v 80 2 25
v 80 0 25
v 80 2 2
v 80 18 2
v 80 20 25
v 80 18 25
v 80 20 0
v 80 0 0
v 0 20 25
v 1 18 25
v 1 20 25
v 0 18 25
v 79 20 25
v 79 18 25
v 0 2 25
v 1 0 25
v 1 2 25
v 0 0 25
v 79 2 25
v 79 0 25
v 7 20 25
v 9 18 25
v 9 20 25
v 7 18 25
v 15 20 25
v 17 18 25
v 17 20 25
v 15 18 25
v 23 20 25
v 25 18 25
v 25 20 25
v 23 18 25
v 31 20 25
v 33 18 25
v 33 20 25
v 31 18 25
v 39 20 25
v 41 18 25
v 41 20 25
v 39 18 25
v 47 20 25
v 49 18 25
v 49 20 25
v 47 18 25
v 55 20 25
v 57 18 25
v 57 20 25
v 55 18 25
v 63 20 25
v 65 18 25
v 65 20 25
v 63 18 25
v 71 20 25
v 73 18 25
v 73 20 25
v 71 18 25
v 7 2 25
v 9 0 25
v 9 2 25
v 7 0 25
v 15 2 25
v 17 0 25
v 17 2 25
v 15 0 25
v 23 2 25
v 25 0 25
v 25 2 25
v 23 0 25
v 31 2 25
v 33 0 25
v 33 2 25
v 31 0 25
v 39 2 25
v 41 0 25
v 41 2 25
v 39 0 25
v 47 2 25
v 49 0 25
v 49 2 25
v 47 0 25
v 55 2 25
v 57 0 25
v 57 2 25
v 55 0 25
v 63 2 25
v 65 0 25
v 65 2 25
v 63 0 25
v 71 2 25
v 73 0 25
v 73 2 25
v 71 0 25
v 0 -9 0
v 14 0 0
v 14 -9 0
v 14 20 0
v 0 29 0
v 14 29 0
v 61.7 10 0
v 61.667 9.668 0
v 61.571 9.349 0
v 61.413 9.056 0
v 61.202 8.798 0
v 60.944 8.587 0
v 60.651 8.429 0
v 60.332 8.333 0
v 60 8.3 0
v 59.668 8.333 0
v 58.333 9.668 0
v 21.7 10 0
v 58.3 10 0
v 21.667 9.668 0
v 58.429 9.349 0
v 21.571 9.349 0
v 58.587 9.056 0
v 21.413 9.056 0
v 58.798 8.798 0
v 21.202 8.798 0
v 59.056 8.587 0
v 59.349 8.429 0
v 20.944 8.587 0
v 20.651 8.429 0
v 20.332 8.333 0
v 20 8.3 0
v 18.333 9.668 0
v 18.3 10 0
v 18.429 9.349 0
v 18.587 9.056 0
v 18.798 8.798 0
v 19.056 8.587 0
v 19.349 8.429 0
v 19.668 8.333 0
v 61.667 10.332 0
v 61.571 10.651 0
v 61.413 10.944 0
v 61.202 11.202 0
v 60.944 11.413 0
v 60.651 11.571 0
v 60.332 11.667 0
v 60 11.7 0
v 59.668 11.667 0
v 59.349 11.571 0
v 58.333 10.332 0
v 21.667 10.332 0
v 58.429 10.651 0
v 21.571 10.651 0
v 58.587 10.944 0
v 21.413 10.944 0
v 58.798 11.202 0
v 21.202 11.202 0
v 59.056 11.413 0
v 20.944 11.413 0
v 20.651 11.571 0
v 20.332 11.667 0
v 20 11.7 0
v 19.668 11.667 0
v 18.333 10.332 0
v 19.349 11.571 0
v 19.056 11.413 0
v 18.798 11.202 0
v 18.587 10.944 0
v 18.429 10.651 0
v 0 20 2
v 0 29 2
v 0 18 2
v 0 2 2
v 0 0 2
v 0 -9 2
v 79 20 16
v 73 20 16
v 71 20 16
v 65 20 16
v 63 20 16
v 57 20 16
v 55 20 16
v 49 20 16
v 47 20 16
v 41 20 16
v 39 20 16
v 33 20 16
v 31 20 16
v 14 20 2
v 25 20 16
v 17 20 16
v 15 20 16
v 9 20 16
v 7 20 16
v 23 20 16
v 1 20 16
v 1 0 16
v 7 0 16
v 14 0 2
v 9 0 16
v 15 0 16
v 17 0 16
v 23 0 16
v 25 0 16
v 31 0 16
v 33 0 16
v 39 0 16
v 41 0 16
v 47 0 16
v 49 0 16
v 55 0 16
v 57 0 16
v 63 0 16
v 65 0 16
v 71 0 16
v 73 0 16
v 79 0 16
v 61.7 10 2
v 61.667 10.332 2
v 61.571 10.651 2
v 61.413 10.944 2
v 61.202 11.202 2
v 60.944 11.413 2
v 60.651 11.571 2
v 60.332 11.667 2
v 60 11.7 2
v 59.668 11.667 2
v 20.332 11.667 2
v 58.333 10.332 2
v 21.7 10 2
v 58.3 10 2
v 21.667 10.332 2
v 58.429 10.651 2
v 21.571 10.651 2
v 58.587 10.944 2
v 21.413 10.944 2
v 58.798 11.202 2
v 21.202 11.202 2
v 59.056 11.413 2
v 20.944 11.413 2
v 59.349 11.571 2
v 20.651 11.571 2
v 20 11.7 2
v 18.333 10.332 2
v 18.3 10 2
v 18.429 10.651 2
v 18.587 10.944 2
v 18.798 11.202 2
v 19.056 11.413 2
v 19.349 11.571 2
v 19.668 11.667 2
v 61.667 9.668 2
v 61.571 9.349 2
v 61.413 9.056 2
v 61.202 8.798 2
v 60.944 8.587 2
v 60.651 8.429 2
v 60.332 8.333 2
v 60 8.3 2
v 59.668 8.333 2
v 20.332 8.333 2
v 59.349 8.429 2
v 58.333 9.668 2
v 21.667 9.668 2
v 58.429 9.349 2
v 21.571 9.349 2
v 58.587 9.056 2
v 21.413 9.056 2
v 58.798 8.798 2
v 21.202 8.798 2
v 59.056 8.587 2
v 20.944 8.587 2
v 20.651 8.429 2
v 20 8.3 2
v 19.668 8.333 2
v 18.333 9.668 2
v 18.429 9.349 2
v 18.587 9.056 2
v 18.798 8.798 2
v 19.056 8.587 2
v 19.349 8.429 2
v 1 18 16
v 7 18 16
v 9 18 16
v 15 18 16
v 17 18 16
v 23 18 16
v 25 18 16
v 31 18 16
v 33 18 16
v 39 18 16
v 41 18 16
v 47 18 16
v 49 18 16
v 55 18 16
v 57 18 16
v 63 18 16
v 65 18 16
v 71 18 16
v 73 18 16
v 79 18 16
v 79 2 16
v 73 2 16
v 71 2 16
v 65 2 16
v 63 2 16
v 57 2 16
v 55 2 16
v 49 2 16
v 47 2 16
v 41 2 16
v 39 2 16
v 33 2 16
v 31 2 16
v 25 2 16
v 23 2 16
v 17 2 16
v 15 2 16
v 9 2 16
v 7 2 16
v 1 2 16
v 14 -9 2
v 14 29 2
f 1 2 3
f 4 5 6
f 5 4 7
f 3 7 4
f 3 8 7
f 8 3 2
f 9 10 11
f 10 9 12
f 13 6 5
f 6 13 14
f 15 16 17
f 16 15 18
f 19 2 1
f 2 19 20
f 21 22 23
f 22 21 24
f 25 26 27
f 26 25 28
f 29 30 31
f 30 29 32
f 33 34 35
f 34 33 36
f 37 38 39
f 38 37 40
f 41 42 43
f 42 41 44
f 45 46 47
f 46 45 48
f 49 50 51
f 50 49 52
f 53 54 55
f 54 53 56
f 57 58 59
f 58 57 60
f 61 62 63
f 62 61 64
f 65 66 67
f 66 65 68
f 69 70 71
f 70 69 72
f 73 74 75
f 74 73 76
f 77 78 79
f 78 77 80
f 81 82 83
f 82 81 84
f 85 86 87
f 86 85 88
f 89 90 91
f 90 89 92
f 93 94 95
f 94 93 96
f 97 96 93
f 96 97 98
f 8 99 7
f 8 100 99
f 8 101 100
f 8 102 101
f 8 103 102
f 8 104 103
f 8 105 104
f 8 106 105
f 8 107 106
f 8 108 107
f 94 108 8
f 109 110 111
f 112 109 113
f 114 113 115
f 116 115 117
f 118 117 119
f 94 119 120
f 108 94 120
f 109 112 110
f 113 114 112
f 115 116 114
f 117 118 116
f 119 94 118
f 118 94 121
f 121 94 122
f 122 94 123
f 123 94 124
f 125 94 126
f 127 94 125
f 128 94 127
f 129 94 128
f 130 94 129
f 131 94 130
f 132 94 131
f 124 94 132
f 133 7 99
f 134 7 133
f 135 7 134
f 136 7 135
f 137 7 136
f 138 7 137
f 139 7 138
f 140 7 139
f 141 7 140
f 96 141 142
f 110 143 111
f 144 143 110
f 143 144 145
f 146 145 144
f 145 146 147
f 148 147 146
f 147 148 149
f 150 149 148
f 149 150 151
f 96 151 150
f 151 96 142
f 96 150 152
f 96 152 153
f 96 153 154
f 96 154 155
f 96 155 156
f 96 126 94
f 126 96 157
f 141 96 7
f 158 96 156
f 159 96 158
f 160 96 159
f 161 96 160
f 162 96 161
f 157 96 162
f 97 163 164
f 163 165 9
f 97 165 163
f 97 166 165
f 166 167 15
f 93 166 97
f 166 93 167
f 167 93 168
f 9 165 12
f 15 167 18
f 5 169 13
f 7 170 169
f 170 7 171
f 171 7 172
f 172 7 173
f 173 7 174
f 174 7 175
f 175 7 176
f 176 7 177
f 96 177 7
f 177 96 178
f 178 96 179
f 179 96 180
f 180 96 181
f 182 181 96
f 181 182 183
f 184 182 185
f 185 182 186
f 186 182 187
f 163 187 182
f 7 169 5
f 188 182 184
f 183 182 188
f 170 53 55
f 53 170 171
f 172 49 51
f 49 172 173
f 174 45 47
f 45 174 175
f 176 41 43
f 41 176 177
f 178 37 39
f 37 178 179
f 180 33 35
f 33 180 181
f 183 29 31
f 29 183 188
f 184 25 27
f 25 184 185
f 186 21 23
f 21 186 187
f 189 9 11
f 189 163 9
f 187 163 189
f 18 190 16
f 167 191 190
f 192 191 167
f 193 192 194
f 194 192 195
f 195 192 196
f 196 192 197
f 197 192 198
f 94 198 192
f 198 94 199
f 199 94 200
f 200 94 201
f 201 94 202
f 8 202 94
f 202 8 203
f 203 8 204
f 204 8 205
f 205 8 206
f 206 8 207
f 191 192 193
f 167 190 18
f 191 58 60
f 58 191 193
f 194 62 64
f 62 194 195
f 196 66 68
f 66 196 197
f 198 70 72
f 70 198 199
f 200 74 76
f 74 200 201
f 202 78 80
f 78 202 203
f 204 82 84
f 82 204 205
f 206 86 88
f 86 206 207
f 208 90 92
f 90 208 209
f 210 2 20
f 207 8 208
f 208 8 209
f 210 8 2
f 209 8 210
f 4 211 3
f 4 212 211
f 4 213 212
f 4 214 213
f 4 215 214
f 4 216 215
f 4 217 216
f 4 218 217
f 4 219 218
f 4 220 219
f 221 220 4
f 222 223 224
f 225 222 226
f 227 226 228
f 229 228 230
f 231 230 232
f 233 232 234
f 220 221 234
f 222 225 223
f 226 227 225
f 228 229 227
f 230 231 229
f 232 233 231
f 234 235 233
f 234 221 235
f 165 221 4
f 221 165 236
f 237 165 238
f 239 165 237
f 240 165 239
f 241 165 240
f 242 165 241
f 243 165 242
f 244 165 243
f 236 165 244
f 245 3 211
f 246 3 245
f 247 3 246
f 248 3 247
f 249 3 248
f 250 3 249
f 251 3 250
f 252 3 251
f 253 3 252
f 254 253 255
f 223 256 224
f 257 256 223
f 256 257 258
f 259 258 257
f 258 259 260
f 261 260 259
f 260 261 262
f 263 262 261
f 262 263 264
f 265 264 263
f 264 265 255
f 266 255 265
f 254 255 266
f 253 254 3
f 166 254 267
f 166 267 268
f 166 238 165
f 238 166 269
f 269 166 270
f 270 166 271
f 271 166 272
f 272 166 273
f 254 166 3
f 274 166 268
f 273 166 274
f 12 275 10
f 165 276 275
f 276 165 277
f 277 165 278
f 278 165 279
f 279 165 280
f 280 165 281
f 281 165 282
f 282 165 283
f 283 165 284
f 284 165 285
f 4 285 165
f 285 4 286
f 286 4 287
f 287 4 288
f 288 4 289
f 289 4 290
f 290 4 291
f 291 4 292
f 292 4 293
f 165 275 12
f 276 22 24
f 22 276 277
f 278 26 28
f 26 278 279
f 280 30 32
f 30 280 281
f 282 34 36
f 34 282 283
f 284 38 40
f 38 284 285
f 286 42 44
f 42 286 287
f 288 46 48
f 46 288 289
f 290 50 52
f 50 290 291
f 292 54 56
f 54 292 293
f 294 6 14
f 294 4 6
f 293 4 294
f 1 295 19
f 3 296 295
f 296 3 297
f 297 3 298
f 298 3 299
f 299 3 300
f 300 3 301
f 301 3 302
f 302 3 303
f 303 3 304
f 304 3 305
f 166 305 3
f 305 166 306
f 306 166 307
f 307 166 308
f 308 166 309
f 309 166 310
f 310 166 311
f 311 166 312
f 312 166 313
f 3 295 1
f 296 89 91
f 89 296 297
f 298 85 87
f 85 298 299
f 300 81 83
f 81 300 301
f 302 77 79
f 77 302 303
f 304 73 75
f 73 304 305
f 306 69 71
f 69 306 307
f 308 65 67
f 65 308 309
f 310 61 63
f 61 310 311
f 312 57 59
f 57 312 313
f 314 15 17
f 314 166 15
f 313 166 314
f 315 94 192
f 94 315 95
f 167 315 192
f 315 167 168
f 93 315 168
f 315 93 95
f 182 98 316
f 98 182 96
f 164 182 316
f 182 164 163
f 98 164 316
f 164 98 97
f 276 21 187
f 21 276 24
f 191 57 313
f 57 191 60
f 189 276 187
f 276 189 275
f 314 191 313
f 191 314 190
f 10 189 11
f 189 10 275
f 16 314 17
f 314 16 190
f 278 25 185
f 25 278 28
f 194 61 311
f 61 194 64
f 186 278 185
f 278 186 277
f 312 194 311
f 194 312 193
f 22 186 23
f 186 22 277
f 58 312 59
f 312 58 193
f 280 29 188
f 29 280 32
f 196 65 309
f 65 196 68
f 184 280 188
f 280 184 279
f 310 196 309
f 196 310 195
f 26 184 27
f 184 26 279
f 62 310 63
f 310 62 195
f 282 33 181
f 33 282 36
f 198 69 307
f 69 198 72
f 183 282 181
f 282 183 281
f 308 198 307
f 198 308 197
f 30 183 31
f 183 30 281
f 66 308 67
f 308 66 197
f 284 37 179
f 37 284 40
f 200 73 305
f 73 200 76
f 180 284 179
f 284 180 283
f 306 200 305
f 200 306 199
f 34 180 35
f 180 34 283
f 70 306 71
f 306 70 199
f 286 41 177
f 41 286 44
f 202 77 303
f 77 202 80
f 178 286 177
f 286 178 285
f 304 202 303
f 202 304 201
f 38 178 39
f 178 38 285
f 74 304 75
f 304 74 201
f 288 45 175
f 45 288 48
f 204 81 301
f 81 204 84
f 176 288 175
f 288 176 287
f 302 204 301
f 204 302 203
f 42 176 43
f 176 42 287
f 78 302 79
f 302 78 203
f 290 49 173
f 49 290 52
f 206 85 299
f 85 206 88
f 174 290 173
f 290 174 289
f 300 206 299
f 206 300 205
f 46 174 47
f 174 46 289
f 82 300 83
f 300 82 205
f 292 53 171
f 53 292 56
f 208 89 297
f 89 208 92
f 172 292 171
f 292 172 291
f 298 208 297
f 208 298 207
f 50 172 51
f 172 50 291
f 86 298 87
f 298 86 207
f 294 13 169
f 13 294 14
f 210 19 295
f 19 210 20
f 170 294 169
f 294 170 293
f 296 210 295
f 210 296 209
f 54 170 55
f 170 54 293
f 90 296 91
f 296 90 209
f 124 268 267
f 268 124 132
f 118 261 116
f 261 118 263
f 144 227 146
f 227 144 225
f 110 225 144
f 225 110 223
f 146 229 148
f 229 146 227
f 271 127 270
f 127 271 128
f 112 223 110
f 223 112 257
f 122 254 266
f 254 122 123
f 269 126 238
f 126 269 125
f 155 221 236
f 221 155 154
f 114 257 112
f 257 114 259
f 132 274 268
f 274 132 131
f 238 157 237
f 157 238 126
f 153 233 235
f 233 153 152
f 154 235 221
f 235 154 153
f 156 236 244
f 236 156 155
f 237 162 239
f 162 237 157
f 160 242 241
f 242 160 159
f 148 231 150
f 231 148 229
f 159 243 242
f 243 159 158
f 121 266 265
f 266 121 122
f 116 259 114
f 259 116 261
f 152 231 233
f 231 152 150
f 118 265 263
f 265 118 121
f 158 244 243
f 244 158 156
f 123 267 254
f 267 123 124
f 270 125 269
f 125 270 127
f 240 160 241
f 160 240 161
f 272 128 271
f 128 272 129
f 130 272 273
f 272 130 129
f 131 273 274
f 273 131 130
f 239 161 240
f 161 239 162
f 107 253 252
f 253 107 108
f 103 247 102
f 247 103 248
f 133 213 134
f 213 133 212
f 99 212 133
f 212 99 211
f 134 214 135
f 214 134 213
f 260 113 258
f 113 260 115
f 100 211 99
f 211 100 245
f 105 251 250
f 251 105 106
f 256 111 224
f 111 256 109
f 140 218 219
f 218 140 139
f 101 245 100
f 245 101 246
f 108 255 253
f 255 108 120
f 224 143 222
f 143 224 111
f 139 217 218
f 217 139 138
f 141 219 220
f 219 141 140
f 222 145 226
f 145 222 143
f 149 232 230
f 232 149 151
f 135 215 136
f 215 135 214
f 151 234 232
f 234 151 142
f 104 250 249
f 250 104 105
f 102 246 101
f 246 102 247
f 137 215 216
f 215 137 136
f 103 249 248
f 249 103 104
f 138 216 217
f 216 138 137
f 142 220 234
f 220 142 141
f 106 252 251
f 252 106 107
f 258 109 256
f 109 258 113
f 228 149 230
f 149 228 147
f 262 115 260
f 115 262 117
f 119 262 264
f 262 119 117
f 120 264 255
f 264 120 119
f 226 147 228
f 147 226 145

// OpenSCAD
$fn = 32;

// ----------------------------------------------------------------------
// Cable duct: 80 x 20 x 25 mm, 10 fingers
// ----------------------------------------------------------------------

// --- parameters (mm) ---
tray_len = 80;            // duct length, X
tray_w = 20;              // duct width, Y
tray_h = 25;              // duct height, Z
tray_t = 2;               // side wall thickness
floor_t = 2;              // floor thickness
slot_w = 6;               // finger slot width
slot_h = 14;              // finger slot height
fingers = 10;             // number of finger slots per side
pitch = 8;                // finger pitch
hole_d = 3.4;             // floor mounting hole
hole_n = 2;               // mounting holes in the floor
ear_w = 10;               // mounting ear width
ear_l = 14;               // mounting ear length

module shell() {
  difference() {
    cube([tray_len, tray_w, tray_h]);
    /* open top channel */
    translate([-tray_t - 1, tray_t, floor_t])
      cube([tray_len + 2 * tray_t + 2, tray_w - 2 * tray_t, tray_h + 1]);
  }
}

module ears() {
  translate([0, -ear_w + 1, 0]) cube([ear_l, ear_w, floor_t]);
  translate([0, tray_w - 1, 0]) cube([ear_l, ear_w, floor_t]);
}

difference() {
  union() {
    shell();
    ears();
  }
  /* finger slots cut through both side walls */
  for (i = [0 : fingers - 1]) translate([pitch / 2 + i * pitch - slot_w / 2, -1, floor_t + slot_h]) cube([slot_w, tray_w + 2, tray_h]);
  for (i = [0 : hole_n - 1]) translate([(tray_len / hole_n) * (i + 0.5), tray_w / 2, -1]) cylinder(h = floor_t + 2, d = hole_d);
}
